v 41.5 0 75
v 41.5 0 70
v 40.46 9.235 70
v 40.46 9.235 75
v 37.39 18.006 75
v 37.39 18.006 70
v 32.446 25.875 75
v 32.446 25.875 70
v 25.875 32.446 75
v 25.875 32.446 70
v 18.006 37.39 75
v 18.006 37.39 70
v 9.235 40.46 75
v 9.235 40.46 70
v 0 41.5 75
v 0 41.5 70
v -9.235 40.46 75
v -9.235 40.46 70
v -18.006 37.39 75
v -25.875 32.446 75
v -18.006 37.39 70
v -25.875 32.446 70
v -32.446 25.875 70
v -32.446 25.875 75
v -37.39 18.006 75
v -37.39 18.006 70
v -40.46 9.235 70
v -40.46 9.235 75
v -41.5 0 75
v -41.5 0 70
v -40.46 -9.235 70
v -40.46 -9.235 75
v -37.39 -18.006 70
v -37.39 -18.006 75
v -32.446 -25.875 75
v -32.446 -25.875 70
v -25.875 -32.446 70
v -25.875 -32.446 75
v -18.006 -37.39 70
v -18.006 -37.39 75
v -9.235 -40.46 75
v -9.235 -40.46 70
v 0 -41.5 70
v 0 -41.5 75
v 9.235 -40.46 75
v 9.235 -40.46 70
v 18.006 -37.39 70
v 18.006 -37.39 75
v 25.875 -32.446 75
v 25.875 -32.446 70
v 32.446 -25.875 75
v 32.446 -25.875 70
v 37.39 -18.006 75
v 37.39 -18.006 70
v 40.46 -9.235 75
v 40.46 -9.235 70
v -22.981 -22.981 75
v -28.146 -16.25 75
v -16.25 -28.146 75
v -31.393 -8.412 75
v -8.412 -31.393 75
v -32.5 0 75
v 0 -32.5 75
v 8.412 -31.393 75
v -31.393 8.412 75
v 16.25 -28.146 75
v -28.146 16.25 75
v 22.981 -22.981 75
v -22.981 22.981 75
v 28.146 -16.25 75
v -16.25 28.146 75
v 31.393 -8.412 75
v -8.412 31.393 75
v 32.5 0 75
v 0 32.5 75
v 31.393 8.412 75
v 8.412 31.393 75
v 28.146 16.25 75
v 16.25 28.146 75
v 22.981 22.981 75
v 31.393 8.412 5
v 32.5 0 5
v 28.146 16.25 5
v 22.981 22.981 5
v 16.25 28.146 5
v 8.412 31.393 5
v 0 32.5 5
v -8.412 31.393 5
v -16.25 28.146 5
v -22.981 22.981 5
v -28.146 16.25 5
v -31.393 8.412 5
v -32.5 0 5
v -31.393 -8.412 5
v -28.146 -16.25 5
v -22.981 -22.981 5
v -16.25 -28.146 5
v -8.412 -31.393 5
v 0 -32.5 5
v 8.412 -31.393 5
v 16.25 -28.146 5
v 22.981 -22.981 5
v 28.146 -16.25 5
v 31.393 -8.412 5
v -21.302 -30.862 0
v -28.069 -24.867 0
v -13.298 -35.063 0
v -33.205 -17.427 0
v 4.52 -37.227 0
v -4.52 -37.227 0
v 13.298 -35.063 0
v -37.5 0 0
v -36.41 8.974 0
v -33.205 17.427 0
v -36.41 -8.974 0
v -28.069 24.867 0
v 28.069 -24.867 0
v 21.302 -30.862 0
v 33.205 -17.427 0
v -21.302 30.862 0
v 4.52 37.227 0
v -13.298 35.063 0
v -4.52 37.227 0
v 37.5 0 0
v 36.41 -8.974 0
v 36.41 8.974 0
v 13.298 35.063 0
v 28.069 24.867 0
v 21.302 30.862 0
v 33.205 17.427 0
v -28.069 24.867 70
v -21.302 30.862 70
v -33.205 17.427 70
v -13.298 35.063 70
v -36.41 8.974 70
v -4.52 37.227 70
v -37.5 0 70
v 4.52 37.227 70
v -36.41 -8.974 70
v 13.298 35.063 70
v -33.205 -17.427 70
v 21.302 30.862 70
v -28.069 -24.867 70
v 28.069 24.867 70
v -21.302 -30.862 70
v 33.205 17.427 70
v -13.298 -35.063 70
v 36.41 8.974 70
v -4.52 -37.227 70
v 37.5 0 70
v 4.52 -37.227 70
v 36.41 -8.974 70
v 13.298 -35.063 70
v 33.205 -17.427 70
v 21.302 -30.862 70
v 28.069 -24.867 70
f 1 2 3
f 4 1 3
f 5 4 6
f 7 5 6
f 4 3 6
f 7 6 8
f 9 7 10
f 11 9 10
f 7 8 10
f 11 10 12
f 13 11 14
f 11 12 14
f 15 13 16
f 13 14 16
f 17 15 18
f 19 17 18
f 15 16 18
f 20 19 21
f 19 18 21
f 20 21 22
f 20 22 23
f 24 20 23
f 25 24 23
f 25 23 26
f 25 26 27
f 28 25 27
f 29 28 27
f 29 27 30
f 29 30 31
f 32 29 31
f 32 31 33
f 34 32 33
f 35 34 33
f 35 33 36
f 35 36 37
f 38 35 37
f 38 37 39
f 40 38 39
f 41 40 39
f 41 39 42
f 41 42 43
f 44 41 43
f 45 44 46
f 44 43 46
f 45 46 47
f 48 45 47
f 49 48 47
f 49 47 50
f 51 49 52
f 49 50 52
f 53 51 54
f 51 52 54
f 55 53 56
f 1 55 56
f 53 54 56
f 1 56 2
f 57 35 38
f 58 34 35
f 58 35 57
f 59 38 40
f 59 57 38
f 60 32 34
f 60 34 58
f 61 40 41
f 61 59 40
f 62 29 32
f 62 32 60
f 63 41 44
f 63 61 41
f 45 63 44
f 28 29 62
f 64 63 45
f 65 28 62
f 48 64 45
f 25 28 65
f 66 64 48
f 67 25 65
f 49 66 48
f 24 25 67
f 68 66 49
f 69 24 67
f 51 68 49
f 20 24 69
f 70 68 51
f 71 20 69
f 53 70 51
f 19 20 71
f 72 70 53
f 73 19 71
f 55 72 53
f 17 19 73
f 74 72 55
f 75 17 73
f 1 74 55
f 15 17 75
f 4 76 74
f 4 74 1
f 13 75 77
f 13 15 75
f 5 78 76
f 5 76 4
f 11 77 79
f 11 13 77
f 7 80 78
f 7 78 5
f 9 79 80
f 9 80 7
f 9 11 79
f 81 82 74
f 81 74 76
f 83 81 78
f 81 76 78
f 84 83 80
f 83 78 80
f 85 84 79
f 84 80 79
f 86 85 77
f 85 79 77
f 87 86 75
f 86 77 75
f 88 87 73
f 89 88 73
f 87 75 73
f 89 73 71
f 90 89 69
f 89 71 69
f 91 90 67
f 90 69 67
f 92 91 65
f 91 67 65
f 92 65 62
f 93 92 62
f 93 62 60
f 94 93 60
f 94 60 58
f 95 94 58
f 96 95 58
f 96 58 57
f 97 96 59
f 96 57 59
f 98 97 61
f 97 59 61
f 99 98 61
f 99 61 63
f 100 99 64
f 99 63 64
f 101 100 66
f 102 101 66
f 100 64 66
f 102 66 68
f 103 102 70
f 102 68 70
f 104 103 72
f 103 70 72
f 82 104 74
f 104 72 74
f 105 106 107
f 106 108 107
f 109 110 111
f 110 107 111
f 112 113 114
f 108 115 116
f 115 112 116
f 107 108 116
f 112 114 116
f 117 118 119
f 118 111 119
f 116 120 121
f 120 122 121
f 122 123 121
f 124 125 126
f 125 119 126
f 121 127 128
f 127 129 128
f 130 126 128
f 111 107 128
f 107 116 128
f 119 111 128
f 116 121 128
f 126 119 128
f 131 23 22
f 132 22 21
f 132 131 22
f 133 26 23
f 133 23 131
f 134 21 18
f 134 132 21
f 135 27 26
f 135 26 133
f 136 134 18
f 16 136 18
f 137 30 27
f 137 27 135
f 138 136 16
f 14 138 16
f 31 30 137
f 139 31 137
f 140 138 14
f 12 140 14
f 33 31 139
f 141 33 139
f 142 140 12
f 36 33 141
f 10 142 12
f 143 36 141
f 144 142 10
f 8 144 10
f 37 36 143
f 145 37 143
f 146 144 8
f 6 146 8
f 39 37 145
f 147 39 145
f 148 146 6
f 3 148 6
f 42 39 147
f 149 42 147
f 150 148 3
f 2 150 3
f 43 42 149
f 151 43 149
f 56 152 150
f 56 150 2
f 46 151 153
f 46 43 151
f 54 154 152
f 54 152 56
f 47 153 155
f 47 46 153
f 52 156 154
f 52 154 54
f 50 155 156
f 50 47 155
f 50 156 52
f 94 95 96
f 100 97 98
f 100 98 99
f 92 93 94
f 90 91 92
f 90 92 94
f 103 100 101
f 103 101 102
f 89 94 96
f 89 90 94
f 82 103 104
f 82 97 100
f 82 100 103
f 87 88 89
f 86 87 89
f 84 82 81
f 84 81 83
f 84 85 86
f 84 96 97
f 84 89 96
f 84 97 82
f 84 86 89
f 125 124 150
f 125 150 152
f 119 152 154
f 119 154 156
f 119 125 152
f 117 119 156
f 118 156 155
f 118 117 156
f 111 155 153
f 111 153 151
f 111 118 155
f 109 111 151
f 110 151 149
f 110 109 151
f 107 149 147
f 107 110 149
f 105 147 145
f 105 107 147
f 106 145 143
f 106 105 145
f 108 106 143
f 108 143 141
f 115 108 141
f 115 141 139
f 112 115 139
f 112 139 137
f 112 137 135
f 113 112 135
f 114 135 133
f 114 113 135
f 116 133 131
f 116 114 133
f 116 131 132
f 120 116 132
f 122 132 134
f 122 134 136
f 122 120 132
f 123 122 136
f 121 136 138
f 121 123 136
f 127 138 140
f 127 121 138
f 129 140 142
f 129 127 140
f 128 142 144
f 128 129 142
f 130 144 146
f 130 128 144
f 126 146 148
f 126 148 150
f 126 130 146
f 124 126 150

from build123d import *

# Parameters (mm, degrees)
F0_R     = 41.5
F1_DEPTH = 75
F2_R     = 32.5
F3_DEPTH = 70
F4_R     = 41.5
F4_R_2   = 37.5
F5_DEPTH = 70


with BuildPart() as f1:
    # F0 (on Top) → F1 (new body)
    with BuildSketch(Plane.XY):
        Circle(F0_R)
    extrude(amount=F1_DEPTH)

    # F2 (on face) → F3 (cut)
    with BuildSketch(Plane.XY.offset(75)):
        Circle(F2_R)
    extrude(amount=-F3_DEPTH, mode=Mode.SUBTRACT)

    # F4 (on face) → F5 (cut)
    with BuildSketch(Plane(origin=(0, 0, 0), x_dir=(1, 0, 0), z_dir=(0, 0, -1))):
        Circle(F4_R)
        Circle(F4_R_2, mode=Mode.SUBTRACT)
    extrude(amount=-F5_DEPTH, mode=Mode.SUBTRACT)


solid = f1.part
